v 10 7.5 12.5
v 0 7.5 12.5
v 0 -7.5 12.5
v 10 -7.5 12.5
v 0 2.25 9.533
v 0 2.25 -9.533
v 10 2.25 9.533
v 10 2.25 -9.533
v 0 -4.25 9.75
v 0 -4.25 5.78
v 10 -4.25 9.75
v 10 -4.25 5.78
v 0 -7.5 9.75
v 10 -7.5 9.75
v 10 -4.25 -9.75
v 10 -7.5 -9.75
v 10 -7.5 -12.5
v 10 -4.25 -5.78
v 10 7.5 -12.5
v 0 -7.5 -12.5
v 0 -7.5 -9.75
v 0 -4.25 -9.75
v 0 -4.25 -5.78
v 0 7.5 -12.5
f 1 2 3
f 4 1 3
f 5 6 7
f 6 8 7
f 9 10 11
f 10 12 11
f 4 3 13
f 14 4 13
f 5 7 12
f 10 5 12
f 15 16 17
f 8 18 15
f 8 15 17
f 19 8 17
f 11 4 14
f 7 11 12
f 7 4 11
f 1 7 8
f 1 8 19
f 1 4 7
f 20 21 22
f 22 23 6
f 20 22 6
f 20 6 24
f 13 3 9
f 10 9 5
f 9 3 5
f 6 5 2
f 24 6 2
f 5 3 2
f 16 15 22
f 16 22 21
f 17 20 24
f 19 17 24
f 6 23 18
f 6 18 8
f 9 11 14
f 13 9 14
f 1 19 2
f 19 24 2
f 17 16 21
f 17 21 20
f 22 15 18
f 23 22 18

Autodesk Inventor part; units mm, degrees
ref_plane "YZ Plane" through (0, 0, 0) normal (1, 0, 0) x (0, 1, 0)
ref_plane "XZ Plane" through (0, 0, 0) normal (0, 1, 0) x (-1, 0, 0)
ref_plane "XY Plane" through (0, 0, 0) normal (0, 0, 1) x (1, 0, 0)
sketch "Sketch1" plane through (0, 0, 0) normal (1, 0, 0) x (0, 1, 0)
  line L0 (-7.5, -12.5) -> (7.5, -12.5)
  line L1 (7.5, -12.5) -> (7.5, 12.5)
  line L2 (7.5, 12.5) -> (-7.5, 12.5)
  line L3 (-7.5, 12.5) -> (-7.5, -12.5)
  line L4 (-7.5, -12.5) -> (7.5, 12.5) construction
  line L5 (7.5, -12.5) -> (-7.5, 12.5) construction
  point P0 (0, 0)
  dimension "d0" = 25
  dimension "d1" = 15
extrude "Extrusion1" add sketch "Sketch1" along normal blind 10
sketch "Sketch2" plane through (10, 0, 0) normal (1, 0, 0) x (0, 0, -1)
  line L0 (9.5, -4.5) -> (5.3472, -4.5) projected
  line L1 (9.5, -7.5) -> (9.5, -4.5) projected
  line L2 (9.5, -7.5) -> (22, -7.5) projected
  line L3 (22, 12.5) -> (22, -7.5) projected
  line L4 (-35, 12.5) -> (22, 12.5) projected
  line L5 (-35, 12.5) -> (-35, 59.5) projected
  line L6 (-45, 59.5) -> (-35, 59.5) projected
  line L7 (-45, 59.5) -> (-45, -7.5) projected
  line L8 (-45, -7.5) -> (-9.5, -7.5) projected
  line L9 (-9.5, -4.5) -> (-9.5, -7.5) projected
  line L10 (-5.3472, -4.5) -> (-9.5, -4.5) projected
  line L11 (-9.1, 2) -> (-5.3472, -4.5) projected
  line L12 (9.1, 2) -> (-9.1, 2) projected
  line L13 (5.3472, -4.5) -> (9.1, 2) projected
  line L14 (-9.5, -7.5) -> (9.5, -7.5)
  line L15 (-9.75, -7.25) -> (-44.75, -7.25)
  line L16 (-44.75, -7.25) -> (-44.75, 59.25)
  line L17 (-44.75, 59.25) -> (-35.25, 59.25)
  line L18 (-35.25, 59.25) -> (-35.25, 12.25)
  line L19 (-35.25, 12.25) -> (21.75, 12.25)
  line L20 (21.75, 12.25) -> (21.75, -7.25)
  line L21 (21.75, -7.25) -> (9.75, -7.25)
  line L22 (9.75, -7.25) -> (9.75, -4.25)
  line L23 (9.75, -4.25) -> (5.7802, -4.25)
  line L24 (5.7802, -4.25) -> (9.533, 2.25)
  line L25 (9.533, 2.25) -> (-9.533, 2.25)
  line L26 (-9.533, 2.25) -> (-5.7802, -4.25)
  line L27 (-5.7802, -4.25) -> (-9.75, -4.25)
  line L28 (-9.75, -4.25) -> (-9.75, -7.25)
  line L29 (-9.75, -7.25) -> (-9.75, -7.5)
  line L30 (-12.5, -7.5) -> (12.5, -7.5) projected
  line L31 (9.75, -7.25) -> (9.75, -7.5)
  line L32 (-12.5, -7.5) -> (12.5, -7.5) projected
  point P0 (0, 0)
  dimension "d4" = 0.25
extrude "Extrusion2" cut sketch "Sketch2" against normal blind 10 contours L1 L14 L9 L10 L11 L12 L13 L0 | L0 L13 L12 L11 L10 L9 L8 L29 L28 L27 L26 L25 L24 L23 L22 L31 L2 L1
properties part number "tester"
